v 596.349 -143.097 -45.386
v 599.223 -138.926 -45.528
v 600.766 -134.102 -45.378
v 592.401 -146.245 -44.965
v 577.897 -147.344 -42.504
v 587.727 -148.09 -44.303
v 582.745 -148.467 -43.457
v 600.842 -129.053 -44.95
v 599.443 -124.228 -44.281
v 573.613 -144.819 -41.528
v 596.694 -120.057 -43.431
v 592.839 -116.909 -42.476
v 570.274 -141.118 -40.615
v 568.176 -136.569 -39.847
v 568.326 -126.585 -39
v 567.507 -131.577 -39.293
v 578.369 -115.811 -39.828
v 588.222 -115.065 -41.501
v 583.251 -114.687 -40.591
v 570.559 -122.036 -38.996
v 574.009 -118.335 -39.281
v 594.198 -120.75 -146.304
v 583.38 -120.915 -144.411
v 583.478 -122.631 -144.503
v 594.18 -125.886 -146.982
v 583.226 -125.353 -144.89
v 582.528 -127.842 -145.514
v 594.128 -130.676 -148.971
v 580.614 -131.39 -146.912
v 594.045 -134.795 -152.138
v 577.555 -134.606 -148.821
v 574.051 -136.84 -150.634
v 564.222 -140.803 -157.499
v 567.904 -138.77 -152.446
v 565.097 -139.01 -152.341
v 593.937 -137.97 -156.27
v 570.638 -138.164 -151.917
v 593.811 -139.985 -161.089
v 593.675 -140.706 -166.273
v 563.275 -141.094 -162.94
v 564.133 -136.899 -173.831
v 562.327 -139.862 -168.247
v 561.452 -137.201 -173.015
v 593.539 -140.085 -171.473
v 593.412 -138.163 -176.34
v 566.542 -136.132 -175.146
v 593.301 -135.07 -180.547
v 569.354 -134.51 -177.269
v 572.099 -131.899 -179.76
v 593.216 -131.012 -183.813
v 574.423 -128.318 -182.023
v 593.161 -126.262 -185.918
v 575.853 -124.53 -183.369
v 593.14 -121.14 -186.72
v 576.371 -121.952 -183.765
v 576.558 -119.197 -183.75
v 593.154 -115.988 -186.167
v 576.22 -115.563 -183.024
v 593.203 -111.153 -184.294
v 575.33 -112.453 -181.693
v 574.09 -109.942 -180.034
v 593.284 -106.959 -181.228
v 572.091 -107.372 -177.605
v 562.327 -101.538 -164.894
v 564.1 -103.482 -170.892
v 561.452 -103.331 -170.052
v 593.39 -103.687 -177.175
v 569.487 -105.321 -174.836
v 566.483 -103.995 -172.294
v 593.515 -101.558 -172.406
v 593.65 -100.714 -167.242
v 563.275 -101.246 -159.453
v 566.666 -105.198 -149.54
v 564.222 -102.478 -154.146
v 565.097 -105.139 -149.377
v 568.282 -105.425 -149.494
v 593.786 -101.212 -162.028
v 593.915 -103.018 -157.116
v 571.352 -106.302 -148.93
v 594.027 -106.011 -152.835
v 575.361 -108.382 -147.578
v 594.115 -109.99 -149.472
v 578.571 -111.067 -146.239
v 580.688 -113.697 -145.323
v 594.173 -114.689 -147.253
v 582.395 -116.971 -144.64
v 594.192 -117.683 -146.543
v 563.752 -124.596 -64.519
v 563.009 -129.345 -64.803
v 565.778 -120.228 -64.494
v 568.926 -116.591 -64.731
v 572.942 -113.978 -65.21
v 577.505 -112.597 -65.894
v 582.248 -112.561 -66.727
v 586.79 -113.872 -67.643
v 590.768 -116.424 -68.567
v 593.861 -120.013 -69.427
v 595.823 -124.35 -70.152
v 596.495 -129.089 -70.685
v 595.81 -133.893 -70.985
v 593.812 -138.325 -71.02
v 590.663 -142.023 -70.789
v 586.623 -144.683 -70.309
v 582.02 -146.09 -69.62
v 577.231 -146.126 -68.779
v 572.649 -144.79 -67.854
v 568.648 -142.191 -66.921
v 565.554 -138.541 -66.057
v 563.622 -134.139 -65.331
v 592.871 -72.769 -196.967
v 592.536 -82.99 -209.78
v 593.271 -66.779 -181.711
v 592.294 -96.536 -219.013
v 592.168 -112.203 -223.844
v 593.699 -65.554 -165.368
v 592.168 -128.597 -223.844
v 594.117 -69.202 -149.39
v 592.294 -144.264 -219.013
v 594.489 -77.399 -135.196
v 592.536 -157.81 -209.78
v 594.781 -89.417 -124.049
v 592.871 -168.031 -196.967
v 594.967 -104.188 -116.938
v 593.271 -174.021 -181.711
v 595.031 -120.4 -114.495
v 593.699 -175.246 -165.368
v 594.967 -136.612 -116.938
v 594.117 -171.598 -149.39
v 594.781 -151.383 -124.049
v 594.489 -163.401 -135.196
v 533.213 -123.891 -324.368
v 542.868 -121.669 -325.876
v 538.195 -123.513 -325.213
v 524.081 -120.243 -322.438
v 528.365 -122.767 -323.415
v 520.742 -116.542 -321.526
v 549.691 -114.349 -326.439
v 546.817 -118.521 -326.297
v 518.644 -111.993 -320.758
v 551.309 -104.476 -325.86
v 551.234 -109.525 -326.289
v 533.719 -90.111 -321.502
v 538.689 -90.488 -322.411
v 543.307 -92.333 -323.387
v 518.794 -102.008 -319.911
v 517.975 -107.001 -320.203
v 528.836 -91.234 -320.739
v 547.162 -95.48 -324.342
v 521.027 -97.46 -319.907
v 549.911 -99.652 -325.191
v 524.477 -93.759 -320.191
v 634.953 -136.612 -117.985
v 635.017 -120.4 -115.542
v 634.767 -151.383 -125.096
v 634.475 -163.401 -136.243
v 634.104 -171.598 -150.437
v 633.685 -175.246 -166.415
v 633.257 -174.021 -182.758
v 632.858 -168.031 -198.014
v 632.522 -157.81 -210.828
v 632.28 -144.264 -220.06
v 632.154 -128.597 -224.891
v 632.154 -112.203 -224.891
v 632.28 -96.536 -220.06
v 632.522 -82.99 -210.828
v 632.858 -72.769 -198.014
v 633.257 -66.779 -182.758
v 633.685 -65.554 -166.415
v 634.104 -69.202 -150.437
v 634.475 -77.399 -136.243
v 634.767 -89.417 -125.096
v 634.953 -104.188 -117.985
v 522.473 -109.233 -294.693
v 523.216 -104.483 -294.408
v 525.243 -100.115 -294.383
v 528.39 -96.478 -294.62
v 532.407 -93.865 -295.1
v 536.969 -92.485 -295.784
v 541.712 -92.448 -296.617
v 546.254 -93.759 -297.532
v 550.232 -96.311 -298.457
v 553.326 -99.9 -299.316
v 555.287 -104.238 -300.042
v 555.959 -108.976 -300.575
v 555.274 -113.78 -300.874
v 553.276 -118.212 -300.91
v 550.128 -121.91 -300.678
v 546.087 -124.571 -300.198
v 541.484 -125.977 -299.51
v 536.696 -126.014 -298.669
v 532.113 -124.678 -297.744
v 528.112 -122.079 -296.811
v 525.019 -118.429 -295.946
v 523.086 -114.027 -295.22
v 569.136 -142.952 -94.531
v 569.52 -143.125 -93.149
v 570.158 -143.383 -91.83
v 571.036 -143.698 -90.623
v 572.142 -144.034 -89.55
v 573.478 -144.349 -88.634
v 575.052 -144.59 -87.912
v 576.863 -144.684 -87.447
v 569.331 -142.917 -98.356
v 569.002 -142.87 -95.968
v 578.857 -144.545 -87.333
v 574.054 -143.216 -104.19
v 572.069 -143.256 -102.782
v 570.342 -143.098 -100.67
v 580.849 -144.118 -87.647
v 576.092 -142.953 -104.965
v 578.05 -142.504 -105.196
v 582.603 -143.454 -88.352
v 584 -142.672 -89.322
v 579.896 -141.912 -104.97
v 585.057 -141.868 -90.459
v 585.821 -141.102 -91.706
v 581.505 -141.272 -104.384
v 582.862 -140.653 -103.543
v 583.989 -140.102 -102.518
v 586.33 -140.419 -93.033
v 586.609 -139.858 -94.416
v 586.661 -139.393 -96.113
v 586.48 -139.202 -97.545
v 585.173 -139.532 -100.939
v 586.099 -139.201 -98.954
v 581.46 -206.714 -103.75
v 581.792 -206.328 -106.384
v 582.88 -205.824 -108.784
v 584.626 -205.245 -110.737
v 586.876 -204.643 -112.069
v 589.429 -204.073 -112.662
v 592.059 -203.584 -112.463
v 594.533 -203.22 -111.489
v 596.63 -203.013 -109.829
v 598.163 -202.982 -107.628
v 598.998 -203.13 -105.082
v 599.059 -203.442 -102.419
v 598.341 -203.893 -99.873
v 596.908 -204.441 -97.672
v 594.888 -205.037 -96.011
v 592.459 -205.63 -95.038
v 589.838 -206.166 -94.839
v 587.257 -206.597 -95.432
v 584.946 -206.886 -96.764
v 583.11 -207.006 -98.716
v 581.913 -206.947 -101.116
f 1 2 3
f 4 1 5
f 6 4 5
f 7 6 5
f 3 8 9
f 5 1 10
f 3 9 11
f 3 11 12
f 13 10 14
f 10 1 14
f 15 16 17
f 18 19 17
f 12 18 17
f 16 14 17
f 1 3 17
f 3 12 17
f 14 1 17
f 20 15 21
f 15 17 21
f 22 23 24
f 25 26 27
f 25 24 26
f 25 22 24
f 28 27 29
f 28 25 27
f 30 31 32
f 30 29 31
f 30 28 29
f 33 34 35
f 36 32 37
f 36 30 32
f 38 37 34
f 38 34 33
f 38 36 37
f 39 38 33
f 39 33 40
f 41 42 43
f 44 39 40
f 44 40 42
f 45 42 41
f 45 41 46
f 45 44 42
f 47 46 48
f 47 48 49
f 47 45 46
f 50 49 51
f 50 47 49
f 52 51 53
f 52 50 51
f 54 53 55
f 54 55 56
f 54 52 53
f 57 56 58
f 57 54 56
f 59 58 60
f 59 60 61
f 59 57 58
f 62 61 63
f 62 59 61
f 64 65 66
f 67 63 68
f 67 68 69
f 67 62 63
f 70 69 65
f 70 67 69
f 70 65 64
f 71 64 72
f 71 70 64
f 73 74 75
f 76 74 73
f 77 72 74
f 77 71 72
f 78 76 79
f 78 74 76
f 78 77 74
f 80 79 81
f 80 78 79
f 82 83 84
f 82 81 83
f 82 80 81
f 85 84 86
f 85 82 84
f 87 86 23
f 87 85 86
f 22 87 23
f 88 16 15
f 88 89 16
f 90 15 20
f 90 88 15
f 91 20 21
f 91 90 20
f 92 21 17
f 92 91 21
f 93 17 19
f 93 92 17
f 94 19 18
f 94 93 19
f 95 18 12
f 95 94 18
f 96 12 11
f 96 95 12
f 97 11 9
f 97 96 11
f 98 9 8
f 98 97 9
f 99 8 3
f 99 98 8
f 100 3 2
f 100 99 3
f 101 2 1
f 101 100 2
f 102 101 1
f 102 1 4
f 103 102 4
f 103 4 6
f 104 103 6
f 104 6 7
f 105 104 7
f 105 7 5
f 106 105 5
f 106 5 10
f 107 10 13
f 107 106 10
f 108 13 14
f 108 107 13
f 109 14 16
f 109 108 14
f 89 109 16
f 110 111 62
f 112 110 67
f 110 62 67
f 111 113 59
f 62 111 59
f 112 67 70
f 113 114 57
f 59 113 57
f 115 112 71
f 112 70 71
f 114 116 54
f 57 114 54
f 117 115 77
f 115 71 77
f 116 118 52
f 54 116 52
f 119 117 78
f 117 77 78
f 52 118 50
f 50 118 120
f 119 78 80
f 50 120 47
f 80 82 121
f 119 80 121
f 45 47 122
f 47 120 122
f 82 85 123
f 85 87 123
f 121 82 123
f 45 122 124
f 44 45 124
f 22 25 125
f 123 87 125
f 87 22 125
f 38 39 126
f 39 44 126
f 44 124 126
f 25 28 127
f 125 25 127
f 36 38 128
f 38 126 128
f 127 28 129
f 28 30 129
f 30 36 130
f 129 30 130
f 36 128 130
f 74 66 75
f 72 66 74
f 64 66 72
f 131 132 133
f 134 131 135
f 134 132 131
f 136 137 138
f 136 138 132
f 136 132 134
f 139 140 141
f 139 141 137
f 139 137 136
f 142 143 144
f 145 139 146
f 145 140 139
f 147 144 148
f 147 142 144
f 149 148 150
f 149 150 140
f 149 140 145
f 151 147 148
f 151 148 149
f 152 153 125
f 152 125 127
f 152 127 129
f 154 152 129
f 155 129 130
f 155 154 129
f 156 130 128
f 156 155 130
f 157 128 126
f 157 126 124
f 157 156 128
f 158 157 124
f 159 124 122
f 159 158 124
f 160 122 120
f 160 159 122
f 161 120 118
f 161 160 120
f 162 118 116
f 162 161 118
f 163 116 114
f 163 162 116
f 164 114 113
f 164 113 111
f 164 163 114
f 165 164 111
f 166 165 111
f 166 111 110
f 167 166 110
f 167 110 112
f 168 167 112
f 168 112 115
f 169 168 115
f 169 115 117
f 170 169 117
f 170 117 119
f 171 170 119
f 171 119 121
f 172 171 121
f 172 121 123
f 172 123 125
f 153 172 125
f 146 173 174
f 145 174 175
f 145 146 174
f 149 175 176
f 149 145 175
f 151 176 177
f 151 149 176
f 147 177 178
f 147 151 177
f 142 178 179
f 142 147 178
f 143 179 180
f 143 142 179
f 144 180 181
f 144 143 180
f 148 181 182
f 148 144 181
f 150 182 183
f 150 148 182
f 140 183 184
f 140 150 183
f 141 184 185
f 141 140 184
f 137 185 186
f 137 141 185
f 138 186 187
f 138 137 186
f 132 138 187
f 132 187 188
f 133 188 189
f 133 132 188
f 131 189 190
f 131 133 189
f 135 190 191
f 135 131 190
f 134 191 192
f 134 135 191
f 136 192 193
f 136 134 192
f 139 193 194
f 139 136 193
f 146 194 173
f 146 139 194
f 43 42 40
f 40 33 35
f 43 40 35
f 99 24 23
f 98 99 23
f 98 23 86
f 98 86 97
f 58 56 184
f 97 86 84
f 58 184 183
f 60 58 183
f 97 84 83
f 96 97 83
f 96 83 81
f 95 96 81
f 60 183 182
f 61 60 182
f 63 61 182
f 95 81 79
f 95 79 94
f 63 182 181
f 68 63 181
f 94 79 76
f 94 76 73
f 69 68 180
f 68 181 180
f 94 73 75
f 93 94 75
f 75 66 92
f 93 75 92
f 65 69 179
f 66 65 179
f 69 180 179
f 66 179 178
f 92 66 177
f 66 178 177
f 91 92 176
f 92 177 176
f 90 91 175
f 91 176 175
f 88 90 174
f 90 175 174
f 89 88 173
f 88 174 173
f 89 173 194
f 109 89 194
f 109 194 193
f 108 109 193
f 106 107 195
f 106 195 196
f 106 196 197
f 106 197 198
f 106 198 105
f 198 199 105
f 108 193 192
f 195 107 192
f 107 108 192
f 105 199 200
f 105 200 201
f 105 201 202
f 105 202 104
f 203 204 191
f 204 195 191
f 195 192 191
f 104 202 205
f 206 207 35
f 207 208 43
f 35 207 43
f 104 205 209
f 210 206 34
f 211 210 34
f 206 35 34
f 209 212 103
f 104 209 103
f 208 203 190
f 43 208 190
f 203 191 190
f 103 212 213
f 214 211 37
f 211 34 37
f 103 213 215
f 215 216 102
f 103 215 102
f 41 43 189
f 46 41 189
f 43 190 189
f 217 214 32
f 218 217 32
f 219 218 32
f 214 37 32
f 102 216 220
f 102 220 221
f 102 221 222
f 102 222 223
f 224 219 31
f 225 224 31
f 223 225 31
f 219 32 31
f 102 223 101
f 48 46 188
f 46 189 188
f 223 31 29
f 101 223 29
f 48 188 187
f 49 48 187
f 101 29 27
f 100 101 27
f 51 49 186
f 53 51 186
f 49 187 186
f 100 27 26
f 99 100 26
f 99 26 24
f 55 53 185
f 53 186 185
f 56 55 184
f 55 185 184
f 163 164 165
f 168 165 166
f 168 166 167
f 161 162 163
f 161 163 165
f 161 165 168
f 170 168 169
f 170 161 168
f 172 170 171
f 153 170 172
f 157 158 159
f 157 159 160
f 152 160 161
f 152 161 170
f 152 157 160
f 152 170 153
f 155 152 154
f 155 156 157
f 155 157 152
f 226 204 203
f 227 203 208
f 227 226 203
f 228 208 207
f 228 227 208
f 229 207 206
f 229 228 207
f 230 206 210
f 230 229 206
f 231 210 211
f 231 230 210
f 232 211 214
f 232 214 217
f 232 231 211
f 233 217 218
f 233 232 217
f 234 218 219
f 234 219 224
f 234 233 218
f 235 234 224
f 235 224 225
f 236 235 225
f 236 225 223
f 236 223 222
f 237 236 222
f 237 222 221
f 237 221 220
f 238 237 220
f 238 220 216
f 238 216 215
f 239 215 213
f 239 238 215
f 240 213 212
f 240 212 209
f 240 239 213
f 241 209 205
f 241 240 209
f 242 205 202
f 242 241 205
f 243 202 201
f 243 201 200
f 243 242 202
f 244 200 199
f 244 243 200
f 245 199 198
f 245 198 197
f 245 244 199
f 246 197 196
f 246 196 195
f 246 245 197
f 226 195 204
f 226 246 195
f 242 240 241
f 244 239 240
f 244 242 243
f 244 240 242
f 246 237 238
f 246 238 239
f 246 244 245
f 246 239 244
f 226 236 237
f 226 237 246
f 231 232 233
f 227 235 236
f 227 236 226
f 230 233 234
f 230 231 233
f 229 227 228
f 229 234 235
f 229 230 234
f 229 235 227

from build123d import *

# Parameters (mm, degrees)
SUSP_FR_UCA_BALL_JOINT_PROFILE_R  = 17
SUSP_FR_LCA_BALL_JOINT_PROFILE_R  = 17
SUSP_FR_UPRIGHT_KINGPIN_START     = -189.376138003
SUSP_FR_UPRIGHT_KINGPIN_OUTLINE_R = 17
SUSP_FR_UPRIGHT_KINGPIN_DEPTH     = 234.300819272
SUSP_FR_UPRIGHT_SPINDLE_PROFILE_R = 20
SUSP_FR_UPRIGHT_ARM_PROFILE_R     = 9
SUSP_FR_HUB_PROFILE_R             = 55


# Read off the part's stored shape, not the designer's step: SUSP_FR_upright_kingpin
with BuildPart() as part:
    # SUSP_FR_UCA_ball_joint: sweep along a curve in space
    with BuildLine() as susp_fr_uca_ball_joint_path:
        Line((539.215175, -109.232527, -297.644798), (534.716988, -107.000649, -323.155287))
    # SUSP_FR_UCA_ball_joint profile (on start of the path) → SUSP_FR_UCA_ball_joint (sweep)
    with BuildSketch(Plane(origin=(539.215175, -109.232527, -297.644798), x_dir=(-0.9848077563247088, 0, 0.17364815888080395), z_dir=(-0.1730071904249639, 0.0858414606043016, -0.981172643168663))):
        Circle(SUSP_FR_UCA_BALL_JOINT_PROFILE_R)
    sweep(path=susp_fr_uca_ball_joint_path.line)


with BuildPart() as body_2:
    # SUSP_FR_LCA_ball_joint: sweep along a curve in space
    with BuildLine() as susp_fr_lca_ball_joint_path:
        Line((584.249094, -131.577136, -42.2447557), (579.750906, -129.345257, -67.7552443))
    # SUSP_FR_LCA_ball_joint profile (on start of the path) → SUSP_FR_LCA_ball_joint (sweep)
    with BuildSketch(Plane(origin=(584.249094, -131.577136, -42.2447557), x_dir=(-0.9848077492574088, 0, 0.17364819896145425), z_dir=(-0.17300722977562832, 0.08584149950700166, -0.9811726328265339))):
        Circle(SUSP_FR_LCA_BALL_JOINT_PROFILE_R)
    sweep(path=susp_fr_lca_ball_joint_path.line)


with BuildPart() as susp_fr_upright_kingpin_tool:
    # SUSP_FR_upright_kingpin outline → SUSP_FR_upright_kingpin (new body)
    with BuildSketch(Plane(origin=(0, 0, 0), x_dir=(0.9849205583589563, 0.01507857135321185, -0.17234886250807685), z_dir=(0.17300720713855208, -0.08584148118504255, 0.9811726384210254)).offset(SUSP_FR_UPRIGHT_KINGPIN_START)):
        with Locations((580.73578395, -134.758317541)):
            Circle(SUSP_FR_UPRIGHT_KINGPIN_OUTLINE_R)
    extrude(amount=SUSP_FR_UPRIGHT_KINGPIN_DEPTH)


with BuildPart() as part_1:
    add(part.part)


with BuildPart() as part_2:
    # SUSP_FR_upright_kingpin: joined with susp_fr_upright_kingpin_tool
    add(part_1.part.fuse(susp_fr_upright_kingpin_tool.part, body_2.part, tol=0.00001))

    # SUSP_FR_upright_spindle: sweep along a curve in space
    with BuildLine() as susp_fr_upright_spindle_path:
        Line((563.274706, -121.170213, -161.19642), (613.584449, -120.4, -170))
    # SUSP_FR_upright_spindle profile (on start of the path) → SUSP_FR_upright_spindle (sweep)
    with BuildSketch(Plane(origin=(563.274706, -121.170213, -161.19642), x_dir=(0.17236845779024892, 0, 0.9850325450252957), z_dir=(0.9849205586549441, 0.015078562779446367, -0.17234886156670431))):
        Circle(SUSP_FR_UPRIGHT_SPINDLE_PROFILE_R)
    sweep(path=susp_fr_upright_spindle_path.line)

    # SUSP_FR_upright_arm: sweep along a curve in space
    with BuildLine() as susp_fr_upright_arm_path:
        Line((575.079712, -127.027537, -94.2469055), (590.293517, -204.990503, -103.750386))
    # SUSP_FR_upright_arm profile (on start of the path) → SUSP_FR_upright_arm (sweep)
    with BuildSketch(Plane(origin=(575.079712, -127.027537, -94.2469055), x_dir=(-0.9814869975187847, -0.1915287803479187, 0), z_dir=(0.19017256143460165, -0.9745370695403799, -0.1187935055844866))):
        Circle(SUSP_FR_UPRIGHT_ARM_PROFILE_R)
    sweep(path=susp_fr_upright_arm_path.line)

    # SUSP_FR_hub: sweep along a curve in space
    with BuildLine() as susp_fr_hub_path:
        Line((593.591303, -120.4, -169.476461), (633.577596, -120.4, -170.523539))
    # SUSP_FR_hub profile (on start of the path) → SUSP_FR_hub (sweep)
    with BuildSketch(Plane(origin=(593.591303, -120.4, -169.476461), x_dir=(0.026176949998200826, 0, 0.9996573249312944), z_dir=(0.9996573249312944, 0, -0.026176949998200826))):
        Circle(SUSP_FR_HUB_PROFILE_R)
    sweep(path=susp_fr_hub_path.line)


solid = part_2.part
